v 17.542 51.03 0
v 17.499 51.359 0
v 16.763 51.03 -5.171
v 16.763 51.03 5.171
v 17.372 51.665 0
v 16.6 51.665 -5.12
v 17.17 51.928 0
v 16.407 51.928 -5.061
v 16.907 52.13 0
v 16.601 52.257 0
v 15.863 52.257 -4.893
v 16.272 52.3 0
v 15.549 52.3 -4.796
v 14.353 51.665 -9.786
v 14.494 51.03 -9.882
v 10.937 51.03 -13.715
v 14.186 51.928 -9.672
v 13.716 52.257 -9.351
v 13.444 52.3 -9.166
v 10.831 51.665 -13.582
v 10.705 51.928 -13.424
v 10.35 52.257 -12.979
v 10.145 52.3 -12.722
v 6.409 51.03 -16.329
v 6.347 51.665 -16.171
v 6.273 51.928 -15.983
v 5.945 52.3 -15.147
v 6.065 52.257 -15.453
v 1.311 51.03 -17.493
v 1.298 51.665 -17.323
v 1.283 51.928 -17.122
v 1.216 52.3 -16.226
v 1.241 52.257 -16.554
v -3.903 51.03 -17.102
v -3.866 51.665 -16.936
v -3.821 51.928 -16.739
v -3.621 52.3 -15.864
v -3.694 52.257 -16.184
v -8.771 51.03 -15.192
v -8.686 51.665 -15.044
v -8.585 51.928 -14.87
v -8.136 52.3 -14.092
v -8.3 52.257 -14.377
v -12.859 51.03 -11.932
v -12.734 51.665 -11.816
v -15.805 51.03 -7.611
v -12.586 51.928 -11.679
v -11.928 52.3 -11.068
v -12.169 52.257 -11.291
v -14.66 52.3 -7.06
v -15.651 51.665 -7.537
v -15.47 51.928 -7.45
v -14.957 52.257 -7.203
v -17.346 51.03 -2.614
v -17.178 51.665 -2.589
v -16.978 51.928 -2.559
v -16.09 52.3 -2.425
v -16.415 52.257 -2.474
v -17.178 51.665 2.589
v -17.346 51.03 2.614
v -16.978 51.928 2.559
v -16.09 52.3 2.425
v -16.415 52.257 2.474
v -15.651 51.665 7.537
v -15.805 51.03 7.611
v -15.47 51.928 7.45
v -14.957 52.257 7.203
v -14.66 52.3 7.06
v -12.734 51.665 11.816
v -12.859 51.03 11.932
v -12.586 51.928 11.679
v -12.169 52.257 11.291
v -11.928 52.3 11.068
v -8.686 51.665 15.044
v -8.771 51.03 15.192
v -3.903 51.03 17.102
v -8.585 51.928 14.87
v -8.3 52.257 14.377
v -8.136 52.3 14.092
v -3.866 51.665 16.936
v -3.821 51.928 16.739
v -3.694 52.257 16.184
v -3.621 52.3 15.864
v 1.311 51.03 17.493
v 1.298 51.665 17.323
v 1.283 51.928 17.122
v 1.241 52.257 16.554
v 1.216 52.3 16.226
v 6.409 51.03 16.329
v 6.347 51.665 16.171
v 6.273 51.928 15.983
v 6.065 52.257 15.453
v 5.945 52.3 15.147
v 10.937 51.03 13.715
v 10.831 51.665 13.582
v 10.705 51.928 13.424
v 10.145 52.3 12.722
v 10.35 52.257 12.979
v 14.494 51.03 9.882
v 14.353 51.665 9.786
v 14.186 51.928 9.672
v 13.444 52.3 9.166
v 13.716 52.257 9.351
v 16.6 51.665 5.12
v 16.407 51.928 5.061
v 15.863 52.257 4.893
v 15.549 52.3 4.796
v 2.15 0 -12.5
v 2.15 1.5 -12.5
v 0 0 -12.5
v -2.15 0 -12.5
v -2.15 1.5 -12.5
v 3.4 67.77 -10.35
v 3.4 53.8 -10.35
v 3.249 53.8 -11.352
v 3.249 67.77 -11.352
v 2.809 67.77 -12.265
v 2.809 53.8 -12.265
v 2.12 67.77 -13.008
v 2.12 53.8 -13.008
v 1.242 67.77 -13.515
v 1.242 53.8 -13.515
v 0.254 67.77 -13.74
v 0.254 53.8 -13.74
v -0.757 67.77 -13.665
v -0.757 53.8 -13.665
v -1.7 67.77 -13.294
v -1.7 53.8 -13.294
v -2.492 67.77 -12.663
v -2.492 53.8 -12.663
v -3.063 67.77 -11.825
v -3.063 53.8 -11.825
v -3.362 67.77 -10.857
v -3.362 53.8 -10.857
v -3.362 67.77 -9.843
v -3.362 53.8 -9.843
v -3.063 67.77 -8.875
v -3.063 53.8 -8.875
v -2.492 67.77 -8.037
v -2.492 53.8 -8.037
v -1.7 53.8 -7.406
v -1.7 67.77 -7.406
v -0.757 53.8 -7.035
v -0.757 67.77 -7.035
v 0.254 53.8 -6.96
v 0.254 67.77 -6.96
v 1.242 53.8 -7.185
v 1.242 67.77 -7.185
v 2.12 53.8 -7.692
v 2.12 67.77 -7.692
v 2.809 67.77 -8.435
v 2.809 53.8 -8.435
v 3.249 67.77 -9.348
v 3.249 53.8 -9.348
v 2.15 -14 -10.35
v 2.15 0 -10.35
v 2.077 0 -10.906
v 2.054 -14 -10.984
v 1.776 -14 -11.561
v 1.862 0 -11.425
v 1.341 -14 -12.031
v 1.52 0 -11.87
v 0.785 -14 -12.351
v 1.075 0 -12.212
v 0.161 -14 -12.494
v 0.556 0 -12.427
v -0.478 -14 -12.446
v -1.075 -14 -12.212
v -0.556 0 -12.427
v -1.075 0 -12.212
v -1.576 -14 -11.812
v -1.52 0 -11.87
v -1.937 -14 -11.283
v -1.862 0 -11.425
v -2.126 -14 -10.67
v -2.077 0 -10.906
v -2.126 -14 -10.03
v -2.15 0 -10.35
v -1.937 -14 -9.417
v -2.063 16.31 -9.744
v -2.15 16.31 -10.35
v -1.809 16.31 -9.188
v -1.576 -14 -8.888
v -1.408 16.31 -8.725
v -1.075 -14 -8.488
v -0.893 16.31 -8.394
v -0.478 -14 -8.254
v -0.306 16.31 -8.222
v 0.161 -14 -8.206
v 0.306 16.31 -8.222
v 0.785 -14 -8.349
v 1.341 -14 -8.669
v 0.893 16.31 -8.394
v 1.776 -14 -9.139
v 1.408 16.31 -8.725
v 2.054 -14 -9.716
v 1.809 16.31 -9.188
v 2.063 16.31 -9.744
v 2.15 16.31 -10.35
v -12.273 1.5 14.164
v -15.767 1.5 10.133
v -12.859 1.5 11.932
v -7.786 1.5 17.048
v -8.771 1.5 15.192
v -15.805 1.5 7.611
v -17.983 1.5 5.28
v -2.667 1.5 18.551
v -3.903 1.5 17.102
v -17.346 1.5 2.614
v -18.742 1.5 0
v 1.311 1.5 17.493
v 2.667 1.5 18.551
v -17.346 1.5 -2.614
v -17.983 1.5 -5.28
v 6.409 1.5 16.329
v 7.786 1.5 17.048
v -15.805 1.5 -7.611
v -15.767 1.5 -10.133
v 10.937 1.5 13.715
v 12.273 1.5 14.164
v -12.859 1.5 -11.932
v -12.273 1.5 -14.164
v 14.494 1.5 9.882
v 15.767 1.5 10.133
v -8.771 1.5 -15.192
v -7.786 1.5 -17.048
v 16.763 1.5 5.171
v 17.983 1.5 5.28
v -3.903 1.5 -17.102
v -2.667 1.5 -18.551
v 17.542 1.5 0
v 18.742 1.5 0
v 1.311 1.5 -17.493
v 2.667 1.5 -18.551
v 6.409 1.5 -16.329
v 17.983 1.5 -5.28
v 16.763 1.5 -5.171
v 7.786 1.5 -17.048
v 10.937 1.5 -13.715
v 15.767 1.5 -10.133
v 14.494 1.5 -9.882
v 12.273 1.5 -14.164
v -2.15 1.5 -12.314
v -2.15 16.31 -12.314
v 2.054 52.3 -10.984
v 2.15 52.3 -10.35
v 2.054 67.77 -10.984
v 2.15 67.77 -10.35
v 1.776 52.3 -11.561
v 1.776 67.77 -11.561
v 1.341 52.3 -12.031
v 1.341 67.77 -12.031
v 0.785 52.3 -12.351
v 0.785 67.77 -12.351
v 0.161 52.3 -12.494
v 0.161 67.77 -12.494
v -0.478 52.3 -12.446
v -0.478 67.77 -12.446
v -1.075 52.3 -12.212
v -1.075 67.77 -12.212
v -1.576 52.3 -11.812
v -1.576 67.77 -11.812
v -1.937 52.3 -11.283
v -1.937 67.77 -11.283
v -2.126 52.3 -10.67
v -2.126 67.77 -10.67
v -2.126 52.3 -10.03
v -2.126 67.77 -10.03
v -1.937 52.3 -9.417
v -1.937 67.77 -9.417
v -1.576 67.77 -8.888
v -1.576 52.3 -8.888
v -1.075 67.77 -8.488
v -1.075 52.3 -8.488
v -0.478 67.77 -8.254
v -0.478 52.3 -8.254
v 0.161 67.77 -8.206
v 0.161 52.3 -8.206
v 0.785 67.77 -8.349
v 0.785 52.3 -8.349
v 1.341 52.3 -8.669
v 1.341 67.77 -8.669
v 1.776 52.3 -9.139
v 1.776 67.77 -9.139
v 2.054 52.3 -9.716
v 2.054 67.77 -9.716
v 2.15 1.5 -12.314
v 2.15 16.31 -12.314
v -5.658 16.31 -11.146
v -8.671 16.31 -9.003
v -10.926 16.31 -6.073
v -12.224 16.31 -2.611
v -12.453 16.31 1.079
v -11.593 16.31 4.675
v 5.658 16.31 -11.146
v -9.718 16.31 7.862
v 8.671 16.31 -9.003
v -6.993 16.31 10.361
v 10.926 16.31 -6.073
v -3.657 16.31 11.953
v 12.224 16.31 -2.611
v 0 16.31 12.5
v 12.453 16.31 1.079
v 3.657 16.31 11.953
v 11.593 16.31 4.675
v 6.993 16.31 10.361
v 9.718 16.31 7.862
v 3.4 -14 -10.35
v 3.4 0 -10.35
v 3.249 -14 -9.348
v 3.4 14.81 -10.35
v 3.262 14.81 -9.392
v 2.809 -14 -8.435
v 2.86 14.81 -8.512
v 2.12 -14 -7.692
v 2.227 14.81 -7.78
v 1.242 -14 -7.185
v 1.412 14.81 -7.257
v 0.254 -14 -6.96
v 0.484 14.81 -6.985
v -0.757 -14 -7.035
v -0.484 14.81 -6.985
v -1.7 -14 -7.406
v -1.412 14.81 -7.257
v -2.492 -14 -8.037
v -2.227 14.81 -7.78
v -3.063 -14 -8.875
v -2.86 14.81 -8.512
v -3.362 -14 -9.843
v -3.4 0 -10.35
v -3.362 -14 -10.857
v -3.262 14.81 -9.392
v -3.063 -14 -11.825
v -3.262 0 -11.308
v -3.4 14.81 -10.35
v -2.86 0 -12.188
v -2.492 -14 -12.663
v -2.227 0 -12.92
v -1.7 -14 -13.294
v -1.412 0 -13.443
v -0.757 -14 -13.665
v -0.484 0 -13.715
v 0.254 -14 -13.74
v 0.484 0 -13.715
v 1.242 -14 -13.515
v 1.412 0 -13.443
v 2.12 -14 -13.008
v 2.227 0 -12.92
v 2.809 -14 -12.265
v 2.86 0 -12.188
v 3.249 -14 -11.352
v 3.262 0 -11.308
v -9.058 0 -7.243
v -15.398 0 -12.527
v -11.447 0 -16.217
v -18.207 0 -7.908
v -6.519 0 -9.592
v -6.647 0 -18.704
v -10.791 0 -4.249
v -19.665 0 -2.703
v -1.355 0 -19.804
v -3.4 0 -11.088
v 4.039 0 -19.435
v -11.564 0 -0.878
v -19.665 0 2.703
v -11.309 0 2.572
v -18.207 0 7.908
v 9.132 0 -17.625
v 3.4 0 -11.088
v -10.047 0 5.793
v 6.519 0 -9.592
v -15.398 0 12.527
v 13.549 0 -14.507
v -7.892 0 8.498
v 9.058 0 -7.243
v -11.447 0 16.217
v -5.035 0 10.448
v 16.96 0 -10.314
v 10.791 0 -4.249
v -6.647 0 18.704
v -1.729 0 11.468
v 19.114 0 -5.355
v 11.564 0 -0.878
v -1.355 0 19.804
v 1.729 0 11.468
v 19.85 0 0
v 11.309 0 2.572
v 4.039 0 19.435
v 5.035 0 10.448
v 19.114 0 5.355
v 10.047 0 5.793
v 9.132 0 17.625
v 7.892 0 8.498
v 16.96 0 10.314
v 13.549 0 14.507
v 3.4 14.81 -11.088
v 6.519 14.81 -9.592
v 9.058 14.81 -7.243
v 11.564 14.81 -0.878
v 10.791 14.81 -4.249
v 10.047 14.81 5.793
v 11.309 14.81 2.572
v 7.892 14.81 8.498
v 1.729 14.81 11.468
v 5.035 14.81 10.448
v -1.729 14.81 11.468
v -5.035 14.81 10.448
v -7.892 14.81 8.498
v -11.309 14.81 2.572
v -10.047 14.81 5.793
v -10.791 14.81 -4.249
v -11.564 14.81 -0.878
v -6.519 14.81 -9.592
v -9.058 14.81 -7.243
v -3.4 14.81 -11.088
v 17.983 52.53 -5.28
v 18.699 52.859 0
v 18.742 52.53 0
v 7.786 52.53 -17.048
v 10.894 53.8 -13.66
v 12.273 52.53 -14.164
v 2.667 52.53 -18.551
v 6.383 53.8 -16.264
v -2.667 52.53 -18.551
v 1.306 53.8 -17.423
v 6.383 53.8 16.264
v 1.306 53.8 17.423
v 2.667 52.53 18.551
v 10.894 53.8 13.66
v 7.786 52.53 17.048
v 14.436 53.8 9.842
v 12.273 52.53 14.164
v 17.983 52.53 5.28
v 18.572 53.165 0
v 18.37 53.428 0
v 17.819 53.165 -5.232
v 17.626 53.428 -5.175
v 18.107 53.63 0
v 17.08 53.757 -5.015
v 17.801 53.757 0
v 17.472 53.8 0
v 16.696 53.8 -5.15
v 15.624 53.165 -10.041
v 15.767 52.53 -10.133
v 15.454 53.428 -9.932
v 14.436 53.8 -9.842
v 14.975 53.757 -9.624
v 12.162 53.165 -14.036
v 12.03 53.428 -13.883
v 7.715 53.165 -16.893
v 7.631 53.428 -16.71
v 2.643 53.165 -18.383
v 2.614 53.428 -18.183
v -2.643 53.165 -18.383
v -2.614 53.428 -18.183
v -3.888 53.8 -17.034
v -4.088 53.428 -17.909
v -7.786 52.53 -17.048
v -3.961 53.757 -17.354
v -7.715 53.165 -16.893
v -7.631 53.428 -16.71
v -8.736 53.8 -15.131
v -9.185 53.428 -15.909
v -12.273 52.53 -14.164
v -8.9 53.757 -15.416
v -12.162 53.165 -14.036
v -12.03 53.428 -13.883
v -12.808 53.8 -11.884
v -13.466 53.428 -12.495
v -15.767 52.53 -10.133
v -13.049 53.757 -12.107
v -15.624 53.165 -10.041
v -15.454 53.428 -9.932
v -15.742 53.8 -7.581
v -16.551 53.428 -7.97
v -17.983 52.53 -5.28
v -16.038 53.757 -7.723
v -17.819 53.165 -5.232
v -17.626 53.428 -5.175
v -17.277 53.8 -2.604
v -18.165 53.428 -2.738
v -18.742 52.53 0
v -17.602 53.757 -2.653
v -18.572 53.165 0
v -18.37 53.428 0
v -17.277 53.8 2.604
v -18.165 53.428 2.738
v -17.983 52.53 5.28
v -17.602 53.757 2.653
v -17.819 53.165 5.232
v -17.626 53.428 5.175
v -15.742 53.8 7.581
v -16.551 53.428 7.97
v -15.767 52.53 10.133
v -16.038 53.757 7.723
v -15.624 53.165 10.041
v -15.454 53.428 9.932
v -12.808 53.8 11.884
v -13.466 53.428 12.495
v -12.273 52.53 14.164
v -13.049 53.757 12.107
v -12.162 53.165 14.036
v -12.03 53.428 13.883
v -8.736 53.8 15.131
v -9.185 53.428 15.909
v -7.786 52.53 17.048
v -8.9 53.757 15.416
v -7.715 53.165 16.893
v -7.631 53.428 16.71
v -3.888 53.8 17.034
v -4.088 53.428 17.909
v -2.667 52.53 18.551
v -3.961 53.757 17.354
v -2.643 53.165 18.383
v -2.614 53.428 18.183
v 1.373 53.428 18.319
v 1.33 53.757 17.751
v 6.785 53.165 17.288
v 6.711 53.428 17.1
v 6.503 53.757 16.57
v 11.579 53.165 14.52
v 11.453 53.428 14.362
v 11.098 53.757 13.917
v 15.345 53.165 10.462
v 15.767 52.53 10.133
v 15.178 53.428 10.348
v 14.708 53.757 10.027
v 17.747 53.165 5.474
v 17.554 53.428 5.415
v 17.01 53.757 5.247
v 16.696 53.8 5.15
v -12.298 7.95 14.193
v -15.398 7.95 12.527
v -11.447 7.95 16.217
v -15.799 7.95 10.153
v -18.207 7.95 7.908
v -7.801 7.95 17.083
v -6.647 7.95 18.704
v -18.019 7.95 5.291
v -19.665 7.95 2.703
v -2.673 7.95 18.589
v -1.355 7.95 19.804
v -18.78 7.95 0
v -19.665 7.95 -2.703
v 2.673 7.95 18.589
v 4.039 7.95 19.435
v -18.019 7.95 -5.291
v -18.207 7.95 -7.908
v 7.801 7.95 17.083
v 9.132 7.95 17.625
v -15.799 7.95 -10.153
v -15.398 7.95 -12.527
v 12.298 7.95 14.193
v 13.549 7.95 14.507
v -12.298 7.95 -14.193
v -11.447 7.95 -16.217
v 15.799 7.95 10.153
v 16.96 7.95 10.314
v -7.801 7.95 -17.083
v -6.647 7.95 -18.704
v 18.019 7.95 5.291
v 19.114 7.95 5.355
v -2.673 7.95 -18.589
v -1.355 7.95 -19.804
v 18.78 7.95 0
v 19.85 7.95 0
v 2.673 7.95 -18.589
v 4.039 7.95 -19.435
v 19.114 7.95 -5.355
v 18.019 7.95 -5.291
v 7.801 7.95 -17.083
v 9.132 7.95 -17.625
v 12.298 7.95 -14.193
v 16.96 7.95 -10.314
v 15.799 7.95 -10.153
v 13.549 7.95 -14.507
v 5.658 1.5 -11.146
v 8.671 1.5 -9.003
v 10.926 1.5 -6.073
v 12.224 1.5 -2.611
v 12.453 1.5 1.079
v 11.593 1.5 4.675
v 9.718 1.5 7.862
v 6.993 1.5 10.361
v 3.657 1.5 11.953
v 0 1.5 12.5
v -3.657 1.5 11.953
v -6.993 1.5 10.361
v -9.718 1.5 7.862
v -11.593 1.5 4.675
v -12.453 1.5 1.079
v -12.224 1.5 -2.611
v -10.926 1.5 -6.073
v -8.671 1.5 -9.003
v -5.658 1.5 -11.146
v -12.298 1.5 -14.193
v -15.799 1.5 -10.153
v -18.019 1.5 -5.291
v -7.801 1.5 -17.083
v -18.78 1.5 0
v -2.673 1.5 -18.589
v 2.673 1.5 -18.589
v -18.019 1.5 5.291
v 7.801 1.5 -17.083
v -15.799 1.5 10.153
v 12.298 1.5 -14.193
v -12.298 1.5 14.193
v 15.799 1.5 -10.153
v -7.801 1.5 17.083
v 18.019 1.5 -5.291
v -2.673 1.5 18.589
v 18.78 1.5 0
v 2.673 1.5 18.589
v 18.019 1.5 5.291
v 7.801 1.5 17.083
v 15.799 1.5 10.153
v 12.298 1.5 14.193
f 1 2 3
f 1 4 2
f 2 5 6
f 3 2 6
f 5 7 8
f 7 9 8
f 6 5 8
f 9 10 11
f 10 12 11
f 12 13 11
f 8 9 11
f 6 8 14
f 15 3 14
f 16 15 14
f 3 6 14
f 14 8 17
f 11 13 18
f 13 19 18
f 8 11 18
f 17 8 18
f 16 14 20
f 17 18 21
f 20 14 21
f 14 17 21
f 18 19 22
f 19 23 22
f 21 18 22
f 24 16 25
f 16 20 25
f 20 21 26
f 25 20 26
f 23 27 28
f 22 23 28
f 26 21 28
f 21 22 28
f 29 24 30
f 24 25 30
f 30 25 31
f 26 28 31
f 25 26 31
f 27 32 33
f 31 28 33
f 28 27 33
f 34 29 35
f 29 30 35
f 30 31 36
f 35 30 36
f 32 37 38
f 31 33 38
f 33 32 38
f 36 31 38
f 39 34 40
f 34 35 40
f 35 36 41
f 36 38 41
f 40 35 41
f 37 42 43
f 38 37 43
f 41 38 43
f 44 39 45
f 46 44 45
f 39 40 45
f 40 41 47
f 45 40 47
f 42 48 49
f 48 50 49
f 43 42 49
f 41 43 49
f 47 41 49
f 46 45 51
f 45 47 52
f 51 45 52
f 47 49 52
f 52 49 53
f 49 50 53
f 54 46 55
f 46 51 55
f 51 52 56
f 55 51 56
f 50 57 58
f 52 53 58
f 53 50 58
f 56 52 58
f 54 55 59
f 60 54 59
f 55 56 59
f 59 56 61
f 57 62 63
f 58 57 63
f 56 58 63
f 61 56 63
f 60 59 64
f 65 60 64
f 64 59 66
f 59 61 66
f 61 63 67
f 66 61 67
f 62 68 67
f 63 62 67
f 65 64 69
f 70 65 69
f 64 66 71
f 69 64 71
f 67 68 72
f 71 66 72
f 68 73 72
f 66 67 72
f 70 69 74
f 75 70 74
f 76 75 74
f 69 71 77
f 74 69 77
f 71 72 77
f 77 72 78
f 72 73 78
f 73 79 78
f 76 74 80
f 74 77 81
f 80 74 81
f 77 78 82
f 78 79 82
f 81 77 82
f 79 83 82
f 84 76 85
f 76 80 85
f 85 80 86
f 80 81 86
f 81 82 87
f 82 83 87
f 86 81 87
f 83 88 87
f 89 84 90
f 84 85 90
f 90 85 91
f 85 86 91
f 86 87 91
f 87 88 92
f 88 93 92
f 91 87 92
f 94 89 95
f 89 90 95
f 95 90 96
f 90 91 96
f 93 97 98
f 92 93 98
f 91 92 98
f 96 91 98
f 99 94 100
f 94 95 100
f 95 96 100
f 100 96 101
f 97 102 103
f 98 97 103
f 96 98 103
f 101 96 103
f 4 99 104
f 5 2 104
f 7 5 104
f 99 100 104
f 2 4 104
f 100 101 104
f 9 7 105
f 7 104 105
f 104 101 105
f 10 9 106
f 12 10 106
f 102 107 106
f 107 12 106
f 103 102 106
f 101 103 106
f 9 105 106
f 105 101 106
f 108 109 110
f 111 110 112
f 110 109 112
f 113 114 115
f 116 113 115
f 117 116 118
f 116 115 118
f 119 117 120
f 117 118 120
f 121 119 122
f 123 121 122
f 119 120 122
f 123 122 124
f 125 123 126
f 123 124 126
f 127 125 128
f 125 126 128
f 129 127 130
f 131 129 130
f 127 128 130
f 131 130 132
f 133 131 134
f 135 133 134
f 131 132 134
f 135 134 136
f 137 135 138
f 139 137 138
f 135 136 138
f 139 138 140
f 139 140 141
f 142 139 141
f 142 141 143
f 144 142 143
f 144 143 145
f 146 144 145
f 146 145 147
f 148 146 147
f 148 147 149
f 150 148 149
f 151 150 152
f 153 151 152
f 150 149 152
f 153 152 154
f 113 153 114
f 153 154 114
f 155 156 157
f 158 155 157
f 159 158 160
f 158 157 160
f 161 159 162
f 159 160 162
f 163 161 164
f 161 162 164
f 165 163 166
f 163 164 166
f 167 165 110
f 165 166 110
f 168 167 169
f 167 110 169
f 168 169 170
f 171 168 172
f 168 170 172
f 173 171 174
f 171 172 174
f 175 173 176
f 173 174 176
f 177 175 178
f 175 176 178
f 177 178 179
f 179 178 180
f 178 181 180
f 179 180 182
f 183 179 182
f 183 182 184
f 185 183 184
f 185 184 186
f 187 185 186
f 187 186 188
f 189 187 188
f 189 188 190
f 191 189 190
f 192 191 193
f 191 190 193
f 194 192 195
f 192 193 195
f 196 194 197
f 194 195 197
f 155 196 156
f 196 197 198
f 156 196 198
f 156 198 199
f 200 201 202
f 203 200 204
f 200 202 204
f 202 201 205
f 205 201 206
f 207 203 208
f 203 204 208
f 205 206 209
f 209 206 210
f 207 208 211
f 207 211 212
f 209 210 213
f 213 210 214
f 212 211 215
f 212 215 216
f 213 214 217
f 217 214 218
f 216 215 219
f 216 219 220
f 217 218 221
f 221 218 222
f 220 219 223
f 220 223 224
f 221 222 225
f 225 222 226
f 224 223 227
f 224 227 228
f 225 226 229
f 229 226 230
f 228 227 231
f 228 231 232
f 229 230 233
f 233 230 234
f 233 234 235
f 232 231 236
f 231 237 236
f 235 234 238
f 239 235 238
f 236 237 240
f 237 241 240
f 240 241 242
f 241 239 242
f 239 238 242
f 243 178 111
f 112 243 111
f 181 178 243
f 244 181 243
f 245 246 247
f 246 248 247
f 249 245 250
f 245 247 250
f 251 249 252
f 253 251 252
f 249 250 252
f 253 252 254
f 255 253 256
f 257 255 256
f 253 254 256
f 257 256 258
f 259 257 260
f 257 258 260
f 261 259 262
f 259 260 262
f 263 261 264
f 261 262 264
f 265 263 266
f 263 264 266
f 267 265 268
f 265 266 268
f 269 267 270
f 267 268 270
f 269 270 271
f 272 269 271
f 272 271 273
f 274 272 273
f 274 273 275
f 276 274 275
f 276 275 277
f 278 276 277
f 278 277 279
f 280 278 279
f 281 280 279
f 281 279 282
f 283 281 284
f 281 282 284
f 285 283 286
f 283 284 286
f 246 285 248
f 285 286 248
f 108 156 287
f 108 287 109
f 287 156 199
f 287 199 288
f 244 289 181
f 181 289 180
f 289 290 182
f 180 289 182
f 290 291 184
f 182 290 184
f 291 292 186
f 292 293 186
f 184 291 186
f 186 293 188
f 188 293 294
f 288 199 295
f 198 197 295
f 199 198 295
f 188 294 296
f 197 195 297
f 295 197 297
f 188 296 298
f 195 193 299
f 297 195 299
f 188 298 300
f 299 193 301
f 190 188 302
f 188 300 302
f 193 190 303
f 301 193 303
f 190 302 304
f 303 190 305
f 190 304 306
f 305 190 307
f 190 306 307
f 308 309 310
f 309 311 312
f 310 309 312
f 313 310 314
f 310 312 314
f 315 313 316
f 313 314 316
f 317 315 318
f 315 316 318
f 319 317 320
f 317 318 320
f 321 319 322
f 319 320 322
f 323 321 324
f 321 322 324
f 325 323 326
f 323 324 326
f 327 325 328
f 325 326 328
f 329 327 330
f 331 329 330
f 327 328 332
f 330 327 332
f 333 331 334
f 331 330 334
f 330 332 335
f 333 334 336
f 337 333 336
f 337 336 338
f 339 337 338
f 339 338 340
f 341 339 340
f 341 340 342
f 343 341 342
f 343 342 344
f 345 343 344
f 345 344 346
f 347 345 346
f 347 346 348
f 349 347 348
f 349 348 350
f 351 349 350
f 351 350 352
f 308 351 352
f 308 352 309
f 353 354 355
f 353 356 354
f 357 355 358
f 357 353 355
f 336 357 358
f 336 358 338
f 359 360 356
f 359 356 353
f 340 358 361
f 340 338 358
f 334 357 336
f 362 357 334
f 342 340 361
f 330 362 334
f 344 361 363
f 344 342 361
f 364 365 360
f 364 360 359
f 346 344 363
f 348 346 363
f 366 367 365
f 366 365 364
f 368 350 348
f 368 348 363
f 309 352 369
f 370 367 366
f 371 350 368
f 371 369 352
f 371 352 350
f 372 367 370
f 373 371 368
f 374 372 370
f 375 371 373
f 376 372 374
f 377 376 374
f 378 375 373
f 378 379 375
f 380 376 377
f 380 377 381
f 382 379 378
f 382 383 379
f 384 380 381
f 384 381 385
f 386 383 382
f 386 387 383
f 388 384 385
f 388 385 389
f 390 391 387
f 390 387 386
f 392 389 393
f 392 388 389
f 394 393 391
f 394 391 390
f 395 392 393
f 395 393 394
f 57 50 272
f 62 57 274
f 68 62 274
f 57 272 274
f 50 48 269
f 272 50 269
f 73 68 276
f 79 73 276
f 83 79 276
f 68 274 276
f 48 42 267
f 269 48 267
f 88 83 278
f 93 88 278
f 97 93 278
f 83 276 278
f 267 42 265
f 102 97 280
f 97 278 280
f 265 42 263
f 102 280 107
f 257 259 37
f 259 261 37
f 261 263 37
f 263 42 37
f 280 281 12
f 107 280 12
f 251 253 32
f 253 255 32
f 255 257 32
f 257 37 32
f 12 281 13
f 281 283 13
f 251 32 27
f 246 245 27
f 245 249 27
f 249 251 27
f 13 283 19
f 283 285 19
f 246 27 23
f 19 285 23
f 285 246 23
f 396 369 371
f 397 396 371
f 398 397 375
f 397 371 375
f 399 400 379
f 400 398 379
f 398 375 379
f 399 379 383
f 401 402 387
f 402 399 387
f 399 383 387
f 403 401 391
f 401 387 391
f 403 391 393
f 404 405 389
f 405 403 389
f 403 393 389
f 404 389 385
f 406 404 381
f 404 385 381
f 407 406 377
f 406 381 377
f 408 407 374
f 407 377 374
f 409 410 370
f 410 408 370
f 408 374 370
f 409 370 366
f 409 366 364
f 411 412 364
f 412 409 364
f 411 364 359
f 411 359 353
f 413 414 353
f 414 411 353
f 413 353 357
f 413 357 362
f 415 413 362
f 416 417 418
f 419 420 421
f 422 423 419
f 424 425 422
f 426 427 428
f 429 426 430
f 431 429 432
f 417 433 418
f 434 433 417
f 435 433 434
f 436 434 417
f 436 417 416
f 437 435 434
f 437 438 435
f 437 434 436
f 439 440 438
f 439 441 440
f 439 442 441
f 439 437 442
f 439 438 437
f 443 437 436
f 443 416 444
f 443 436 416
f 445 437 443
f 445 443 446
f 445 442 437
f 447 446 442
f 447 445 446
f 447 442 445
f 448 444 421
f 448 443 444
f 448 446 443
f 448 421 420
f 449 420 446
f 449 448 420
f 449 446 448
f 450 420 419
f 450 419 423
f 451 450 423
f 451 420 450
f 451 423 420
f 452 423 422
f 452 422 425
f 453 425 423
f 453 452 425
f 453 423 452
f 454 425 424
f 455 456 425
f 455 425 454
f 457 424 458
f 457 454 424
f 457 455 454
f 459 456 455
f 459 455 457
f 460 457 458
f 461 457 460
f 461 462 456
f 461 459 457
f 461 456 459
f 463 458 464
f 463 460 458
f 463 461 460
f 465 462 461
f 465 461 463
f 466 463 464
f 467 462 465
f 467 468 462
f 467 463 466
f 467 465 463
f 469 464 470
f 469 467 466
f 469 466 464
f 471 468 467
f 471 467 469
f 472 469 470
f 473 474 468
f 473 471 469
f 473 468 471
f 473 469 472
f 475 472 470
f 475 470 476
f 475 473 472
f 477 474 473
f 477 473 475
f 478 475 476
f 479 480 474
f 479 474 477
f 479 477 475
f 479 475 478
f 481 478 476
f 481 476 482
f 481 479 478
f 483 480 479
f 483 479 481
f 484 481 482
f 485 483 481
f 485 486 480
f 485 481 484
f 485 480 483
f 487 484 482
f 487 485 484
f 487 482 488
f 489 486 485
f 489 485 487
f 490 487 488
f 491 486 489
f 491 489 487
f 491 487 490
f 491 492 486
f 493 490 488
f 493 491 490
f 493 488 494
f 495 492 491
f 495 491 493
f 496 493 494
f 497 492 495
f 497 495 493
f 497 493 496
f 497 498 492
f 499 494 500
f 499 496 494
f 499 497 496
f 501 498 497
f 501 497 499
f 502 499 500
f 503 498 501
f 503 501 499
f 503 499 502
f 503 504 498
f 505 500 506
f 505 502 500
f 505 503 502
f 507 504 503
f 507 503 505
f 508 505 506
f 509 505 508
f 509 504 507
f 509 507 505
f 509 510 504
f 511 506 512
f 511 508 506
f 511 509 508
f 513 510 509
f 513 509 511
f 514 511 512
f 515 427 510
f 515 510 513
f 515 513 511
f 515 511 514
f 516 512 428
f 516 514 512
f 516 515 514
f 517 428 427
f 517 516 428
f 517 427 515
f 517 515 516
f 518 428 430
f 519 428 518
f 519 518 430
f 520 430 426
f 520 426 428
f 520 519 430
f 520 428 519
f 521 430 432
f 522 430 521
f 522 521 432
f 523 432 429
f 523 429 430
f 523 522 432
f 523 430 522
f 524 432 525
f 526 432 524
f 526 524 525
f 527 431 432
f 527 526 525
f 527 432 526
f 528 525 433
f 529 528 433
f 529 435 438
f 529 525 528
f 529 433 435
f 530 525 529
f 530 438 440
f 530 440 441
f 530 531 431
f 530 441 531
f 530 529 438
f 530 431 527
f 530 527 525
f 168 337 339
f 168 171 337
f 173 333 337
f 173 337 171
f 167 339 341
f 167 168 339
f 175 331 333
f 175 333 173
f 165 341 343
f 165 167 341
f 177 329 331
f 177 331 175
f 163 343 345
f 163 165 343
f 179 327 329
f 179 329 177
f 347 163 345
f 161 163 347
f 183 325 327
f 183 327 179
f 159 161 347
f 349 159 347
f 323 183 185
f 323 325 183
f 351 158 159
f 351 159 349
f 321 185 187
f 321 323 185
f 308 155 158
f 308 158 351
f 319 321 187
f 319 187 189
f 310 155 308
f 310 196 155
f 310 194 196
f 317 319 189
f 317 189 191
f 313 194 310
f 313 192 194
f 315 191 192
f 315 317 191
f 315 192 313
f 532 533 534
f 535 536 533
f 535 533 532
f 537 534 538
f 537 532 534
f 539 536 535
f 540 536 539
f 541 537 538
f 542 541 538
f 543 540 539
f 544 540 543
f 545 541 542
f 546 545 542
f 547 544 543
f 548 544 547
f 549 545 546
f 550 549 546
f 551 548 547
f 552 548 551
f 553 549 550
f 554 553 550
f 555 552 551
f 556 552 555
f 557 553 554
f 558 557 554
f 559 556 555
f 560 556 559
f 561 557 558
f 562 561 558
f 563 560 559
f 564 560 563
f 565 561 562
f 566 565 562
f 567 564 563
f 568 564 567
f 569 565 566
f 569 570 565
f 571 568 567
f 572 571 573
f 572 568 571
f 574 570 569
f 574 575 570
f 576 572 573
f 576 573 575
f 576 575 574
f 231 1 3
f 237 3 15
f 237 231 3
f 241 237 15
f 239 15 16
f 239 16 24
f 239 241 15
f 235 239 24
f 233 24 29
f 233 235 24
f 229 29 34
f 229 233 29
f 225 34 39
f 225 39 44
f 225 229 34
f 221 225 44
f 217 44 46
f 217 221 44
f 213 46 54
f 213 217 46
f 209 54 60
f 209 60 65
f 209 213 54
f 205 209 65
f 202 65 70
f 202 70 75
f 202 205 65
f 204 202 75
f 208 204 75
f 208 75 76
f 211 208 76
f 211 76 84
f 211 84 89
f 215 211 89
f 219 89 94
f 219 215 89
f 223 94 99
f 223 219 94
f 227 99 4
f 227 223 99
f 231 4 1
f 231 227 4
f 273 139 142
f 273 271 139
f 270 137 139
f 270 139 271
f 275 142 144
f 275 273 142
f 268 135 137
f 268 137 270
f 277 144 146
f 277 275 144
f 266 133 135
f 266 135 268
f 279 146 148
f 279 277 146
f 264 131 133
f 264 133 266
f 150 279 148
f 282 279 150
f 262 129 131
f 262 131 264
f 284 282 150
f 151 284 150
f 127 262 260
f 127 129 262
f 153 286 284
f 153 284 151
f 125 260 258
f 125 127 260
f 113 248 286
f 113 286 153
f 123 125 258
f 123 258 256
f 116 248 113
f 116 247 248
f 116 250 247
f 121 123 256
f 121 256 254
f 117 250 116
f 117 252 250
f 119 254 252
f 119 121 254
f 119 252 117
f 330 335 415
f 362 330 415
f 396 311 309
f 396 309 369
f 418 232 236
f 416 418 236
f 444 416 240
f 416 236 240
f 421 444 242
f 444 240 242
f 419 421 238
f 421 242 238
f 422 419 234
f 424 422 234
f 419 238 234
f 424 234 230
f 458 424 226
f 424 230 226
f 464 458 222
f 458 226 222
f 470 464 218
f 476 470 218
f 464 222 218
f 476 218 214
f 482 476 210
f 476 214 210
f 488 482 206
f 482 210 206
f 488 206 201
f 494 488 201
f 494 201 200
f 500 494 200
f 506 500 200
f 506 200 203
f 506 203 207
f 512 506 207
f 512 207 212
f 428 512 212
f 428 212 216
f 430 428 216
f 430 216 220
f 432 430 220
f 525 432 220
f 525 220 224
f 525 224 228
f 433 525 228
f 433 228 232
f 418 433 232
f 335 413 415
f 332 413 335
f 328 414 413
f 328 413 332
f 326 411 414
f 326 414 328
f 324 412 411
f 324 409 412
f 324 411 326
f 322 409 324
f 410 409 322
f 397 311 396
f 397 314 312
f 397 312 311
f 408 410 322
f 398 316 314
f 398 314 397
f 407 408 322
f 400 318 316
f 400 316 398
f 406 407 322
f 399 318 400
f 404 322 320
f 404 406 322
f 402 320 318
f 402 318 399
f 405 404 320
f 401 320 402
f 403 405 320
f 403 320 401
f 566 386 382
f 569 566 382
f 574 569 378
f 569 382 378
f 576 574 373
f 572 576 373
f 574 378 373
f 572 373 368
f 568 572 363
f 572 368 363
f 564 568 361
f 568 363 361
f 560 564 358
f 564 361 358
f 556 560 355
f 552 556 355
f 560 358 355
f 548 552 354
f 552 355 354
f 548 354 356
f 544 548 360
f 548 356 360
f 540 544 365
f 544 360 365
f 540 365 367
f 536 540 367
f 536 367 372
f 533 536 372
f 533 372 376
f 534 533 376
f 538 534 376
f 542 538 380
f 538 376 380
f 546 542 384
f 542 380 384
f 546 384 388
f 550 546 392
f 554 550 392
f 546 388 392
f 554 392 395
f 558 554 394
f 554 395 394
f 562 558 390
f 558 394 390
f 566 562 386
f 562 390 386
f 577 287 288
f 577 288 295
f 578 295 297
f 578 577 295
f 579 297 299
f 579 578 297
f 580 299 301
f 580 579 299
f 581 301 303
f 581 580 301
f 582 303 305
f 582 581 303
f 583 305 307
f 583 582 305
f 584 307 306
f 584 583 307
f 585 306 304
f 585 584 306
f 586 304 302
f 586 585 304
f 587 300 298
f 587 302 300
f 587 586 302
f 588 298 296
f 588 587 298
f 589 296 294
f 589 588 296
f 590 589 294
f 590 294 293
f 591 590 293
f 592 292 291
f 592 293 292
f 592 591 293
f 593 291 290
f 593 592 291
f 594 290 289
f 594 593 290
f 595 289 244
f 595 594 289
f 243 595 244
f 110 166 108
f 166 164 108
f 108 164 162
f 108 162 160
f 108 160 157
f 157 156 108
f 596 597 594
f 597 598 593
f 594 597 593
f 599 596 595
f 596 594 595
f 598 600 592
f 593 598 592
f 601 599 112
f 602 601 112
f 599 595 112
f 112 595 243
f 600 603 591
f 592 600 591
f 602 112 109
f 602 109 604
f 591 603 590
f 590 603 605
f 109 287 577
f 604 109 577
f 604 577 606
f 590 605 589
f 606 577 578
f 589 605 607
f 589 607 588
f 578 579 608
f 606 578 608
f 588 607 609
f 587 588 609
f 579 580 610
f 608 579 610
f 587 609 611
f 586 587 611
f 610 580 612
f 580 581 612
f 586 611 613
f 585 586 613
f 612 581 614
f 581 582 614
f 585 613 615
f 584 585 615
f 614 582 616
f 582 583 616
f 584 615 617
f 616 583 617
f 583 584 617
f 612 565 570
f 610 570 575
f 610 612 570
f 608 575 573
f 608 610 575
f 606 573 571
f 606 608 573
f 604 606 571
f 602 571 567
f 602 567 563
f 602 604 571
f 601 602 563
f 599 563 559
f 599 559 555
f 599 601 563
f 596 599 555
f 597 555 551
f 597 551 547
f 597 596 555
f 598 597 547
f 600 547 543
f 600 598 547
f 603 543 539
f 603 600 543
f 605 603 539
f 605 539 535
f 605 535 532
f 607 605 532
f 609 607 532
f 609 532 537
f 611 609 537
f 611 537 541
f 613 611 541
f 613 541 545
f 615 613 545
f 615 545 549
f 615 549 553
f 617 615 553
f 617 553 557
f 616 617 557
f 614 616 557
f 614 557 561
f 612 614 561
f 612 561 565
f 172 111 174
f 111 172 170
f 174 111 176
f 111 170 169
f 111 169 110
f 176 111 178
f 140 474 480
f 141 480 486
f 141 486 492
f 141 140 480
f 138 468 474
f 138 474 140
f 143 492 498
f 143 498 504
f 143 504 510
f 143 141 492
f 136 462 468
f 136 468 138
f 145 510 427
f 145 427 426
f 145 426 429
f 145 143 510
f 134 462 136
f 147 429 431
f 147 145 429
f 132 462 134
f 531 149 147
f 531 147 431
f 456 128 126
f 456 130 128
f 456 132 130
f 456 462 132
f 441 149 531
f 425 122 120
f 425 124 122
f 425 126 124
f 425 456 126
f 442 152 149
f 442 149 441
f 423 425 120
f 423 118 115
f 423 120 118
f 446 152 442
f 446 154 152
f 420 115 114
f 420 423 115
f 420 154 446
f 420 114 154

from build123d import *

# Parameters (mm, degrees)
SKETCH1_R            = 19.85
SKETCH1_R_2          = 18.78
BOSS_EXTRUDE3_DEPTH  = 7.95
SKETCH2_R            = 18.78
BOSS_EXTRUDE5_DEPTH  = 1.5
SKETCH4_R            = 12.5
BOSS_EXTRUDE6_DEPTH  = 16.31
SKETCH5_R            = 2.15
SKETCH5_W            = 4.3
SKETCH5_H            = 2.15
CUT_EXTRUDE2_DEPTH   = 16.31
SKETCH6_R            = 11.597360911
CUT_EXTRUDE3_DEPTH   = 14.809999892
SKETCH12_R           = 3.4
SKETCH12_W           = 6.8
SKETCH12_H           = 3.4
BOSS_EXTRUDE8_DEPTH  = 24.969999892
SKETCH5_6_R          = 2.15
SKETCH5_6_W          = 4.3
SKETCH5_6_H          = 2.15
CUT_EXTRUDE5_DEPTH   = 24.969999892
CUT_EXTRUDE6_START   = -14.81
SKETCH14_R           = 15.219310499
SKETCH14_R_2         = 12.5
CUT_EXTRUDE6_DEPTH   = 14.81
SKETCH17_W           = 6.8
SKETCH17_H           = 2.662223843
CUT_EXTRUDE7_DEPTH   = 16.587999892
SKETCH18_R           = 3.4
SKETCH18_R_2         = 2.15
BOSS_EXTRUDE10_DEPTH = 14
SKETCH19_R           = 5.618160511
SKETCH19_R_2         = 3.4
CUT_EXTRUDE8_DEPTH   = 14
SKETCH20_R           = 18.7419
SKETCH20_R_2         = 17.5419
BOSS_EXTRUDE11_DEPTH = 50.8
SKETCH21_R           = 18.7419
BOSS_EXTRUDE12_DEPTH = 1.5
SKETCH22_R           = 3.4
SKETCH22_R_2         = 2.15
BOSS_EXTRUDE13_DEPTH = 13.97
SKETCH23_R           = 2.15
CUT_EXTRUDE9_DEPTH   = 30.456
FILLET1_R            = 1.27
FILLET2_R            = 1.27


with BuildPart() as part:
    # Sketch1 → Boss-Extrude3 (new body)
    with BuildSketch(Plane(origin=(0, 0, 0), x_dir=(1, 0, 0), z_dir=(0, 1, 0))):
        Circle(SKETCH1_R)
        Circle(SKETCH1_R_2, mode=Mode.SUBTRACT)
    extrude(amount=BOSS_EXTRUDE3_DEPTH)

    # Sketch2 → Boss-Extrude5 (add)
    with BuildSketch(Plane.XZ):
        Circle(SKETCH2_R)
    extrude(amount=-BOSS_EXTRUDE5_DEPTH)


with BuildPart() as body_2:
    # Sketch4 → Boss-Extrude6 (new body)
    with BuildSketch(Plane.XZ):
        Circle(SKETCH4_R)
    extrude(amount=-BOSS_EXTRUDE6_DEPTH)


with BuildPart() as cut_extrude2_tool:
    # Sketch5 → Cut-Extrude2 (new body)
    with BuildSketch(Plane(origin=(0, 16.31, 0), x_dir=(1, 0, 0), z_dir=(0, 1, 0))):
        with Locations((0, 10.35)):
            Circle(SKETCH5_R)
        with Locations((0, 11.425)):
            Rectangle(SKETCH5_W, SKETCH5_H)
    extrude(amount=-CUT_EXTRUDE2_DEPTH)


with BuildPart() as part_1:
    add(part.part)

    # Cut-Extrude2: cut by cut_extrude2_tool
    add(cut_extrude2_tool.part, mode=Mode.SUBTRACT)


with BuildPart() as body_2_1:
    add(body_2.part)

    # Cut-Extrude2: cut by cut_extrude2_tool
    add(cut_extrude2_tool.part, mode=Mode.SUBTRACT)


with BuildPart() as cut_extrude3_tool:
    # Sketch6 → Cut-Extrude3 (new body)
    with BuildSketch(Plane.XZ):
        Circle(SKETCH6_R)
    extrude(amount=-CUT_EXTRUDE3_DEPTH)


with BuildPart() as part_2:
    add(part_1.part)

    # Cut-Extrude3: cut by cut_extrude3_tool
    add(cut_extrude3_tool.part, mode=Mode.SUBTRACT)



with BuildPart() as body_2_2:
    add(body_2_1.part)

    # Cut-Extrude3: cut by cut_extrude3_tool
    add(cut_extrude3_tool.part, mode=Mode.SUBTRACT)


with BuildPart() as part_3:
    add(part_2.part)

    add(body_2_2.part)  # Boss-Extrude8 merges body 2
    # Sketch12 → Boss-Extrude8 (add)
    with BuildSketch(Plane(origin=(0, 16.31, 0), x_dir=(1, 0, 0), z_dir=(0, 1, 0))):
        with Locations((0, 10.35)):
            Circle(SKETCH12_R)
        with Locations((0, 12.05)):
            Rectangle(SKETCH12_W, SKETCH12_H)
    extrude(amount=-BOSS_EXTRUDE8_DEPTH)

    # Sketch5<6> → Cut-Extrude5 (cut)
    with BuildSketch(Plane(origin=(0, 16.31, 0), x_dir=(1, 0, 0), z_dir=(0, 1, 0))):
        with Locations((0, 10.35)):
            Circle(SKETCH5_6_R)
        with Locations((0, 11.425)):
            Rectangle(SKETCH5_6_W, SKETCH5_6_H)
    extrude(amount=-CUT_EXTRUDE5_DEPTH, mode=Mode.SUBTRACT)

    # Sketch14 → Cut-Extrude6 (cut)
    with BuildSketch(Plane(origin=(0, 16.31, 0), x_dir=(1, 0, 0), z_dir=(0, 1, 0)).offset(CUT_EXTRUDE6_START)):
        Circle(SKETCH14_R)
        Circle(SKETCH14_R_2, mode=Mode.SUBTRACT)
    extrude(amount=CUT_EXTRUDE6_DEPTH, mode=Mode.SUBTRACT)

    # Sketch17 → Cut-Extrude7 (cut)
    with BuildSketch(Plane.XZ):
        with Locations((0, -12.418888079)):
            Rectangle(SKETCH17_W, SKETCH17_H)
    extrude(amount=CUT_EXTRUDE7_DEPTH, mode=Mode.SUBTRACT)

    # Sketch18 → Boss-Extrude10 (add)
    with BuildSketch(Plane.XZ):
        with Locations((0, -10.35)):
            Circle(SKETCH18_R)
        with Locations((0, -10.35)):
            Circle(SKETCH18_R_2, mode=Mode.SUBTRACT)
    extrude(amount=BOSS_EXTRUDE10_DEPTH)

    # Sketch19 → Cut-Extrude8 (cut)
    with BuildSketch(Plane.XZ):
        with Locations((0, -10.35)):
            Circle(SKETCH19_R)
        with Locations((0, -10.35)):
            Circle(SKETCH19_R_2, mode=Mode.SUBTRACT)
    extrude(amount=CUT_EXTRUDE8_DEPTH, mode=Mode.SUBTRACT)


with BuildPart() as body_2_2_1:
    # Sketch20 → Boss-Extrude11 (new body)
    with BuildSketch(Plane(origin=(0, 1.5, 0), x_dir=(1, 0, 0), z_dir=(0, 1, 0))):
        Circle(SKETCH20_R)
        Circle(SKETCH20_R_2, mode=Mode.SUBTRACT)
    extrude(amount=BOSS_EXTRUDE11_DEPTH)

    # Sketch21 → Boss-Extrude12 (add)
    with BuildSketch(Plane(origin=(0, 52.3, 0), x_dir=(1, 0, 0), z_dir=(0, 1, 0))):
        Circle(SKETCH21_R)
    extrude(amount=BOSS_EXTRUDE12_DEPTH)

    # Sketch22 → Boss-Extrude13 (add)
    with BuildSketch(Plane(origin=(0, 53.8, 0), x_dir=(1, 0, 0), z_dir=(0, 1, 0))):
        with Locations((0, 10.35)):
            Circle(SKETCH22_R)
        with Locations((0, 10.35)):
            Circle(SKETCH22_R_2, mode=Mode.SUBTRACT)
    extrude(amount=BOSS_EXTRUDE13_DEPTH)

    # Sketch23 → Cut-Extrude9 (cut)
    with BuildSketch(Plane(origin=(0, 67.77, 0), x_dir=(1, 0, 0), z_dir=(0, 1, 0))):
        with Locations((0, 10.35)):
            Circle(SKETCH23_R)
    extrude(amount=-CUT_EXTRUDE9_DEPTH, mode=Mode.SUBTRACT)

    # Fillet1
    fillet1_edges = [body_2_2_1.edges().sort_by_distance(p)[0] for p in [
        (-17.5419, 52.3, 0),
    ]]
    fillet(fillet1_edges, radius=FILLET1_R)

    # Fillet2
    fillet2_edges = [body_2_2_1.edges().sort_by_distance(p)[0] for p in [
        (-18.7419, 53.8, 0),
    ]]
    fillet(fillet2_edges, radius=FILLET2_R)


solid = Compound([part_3.part, body_2_2_1.part])
